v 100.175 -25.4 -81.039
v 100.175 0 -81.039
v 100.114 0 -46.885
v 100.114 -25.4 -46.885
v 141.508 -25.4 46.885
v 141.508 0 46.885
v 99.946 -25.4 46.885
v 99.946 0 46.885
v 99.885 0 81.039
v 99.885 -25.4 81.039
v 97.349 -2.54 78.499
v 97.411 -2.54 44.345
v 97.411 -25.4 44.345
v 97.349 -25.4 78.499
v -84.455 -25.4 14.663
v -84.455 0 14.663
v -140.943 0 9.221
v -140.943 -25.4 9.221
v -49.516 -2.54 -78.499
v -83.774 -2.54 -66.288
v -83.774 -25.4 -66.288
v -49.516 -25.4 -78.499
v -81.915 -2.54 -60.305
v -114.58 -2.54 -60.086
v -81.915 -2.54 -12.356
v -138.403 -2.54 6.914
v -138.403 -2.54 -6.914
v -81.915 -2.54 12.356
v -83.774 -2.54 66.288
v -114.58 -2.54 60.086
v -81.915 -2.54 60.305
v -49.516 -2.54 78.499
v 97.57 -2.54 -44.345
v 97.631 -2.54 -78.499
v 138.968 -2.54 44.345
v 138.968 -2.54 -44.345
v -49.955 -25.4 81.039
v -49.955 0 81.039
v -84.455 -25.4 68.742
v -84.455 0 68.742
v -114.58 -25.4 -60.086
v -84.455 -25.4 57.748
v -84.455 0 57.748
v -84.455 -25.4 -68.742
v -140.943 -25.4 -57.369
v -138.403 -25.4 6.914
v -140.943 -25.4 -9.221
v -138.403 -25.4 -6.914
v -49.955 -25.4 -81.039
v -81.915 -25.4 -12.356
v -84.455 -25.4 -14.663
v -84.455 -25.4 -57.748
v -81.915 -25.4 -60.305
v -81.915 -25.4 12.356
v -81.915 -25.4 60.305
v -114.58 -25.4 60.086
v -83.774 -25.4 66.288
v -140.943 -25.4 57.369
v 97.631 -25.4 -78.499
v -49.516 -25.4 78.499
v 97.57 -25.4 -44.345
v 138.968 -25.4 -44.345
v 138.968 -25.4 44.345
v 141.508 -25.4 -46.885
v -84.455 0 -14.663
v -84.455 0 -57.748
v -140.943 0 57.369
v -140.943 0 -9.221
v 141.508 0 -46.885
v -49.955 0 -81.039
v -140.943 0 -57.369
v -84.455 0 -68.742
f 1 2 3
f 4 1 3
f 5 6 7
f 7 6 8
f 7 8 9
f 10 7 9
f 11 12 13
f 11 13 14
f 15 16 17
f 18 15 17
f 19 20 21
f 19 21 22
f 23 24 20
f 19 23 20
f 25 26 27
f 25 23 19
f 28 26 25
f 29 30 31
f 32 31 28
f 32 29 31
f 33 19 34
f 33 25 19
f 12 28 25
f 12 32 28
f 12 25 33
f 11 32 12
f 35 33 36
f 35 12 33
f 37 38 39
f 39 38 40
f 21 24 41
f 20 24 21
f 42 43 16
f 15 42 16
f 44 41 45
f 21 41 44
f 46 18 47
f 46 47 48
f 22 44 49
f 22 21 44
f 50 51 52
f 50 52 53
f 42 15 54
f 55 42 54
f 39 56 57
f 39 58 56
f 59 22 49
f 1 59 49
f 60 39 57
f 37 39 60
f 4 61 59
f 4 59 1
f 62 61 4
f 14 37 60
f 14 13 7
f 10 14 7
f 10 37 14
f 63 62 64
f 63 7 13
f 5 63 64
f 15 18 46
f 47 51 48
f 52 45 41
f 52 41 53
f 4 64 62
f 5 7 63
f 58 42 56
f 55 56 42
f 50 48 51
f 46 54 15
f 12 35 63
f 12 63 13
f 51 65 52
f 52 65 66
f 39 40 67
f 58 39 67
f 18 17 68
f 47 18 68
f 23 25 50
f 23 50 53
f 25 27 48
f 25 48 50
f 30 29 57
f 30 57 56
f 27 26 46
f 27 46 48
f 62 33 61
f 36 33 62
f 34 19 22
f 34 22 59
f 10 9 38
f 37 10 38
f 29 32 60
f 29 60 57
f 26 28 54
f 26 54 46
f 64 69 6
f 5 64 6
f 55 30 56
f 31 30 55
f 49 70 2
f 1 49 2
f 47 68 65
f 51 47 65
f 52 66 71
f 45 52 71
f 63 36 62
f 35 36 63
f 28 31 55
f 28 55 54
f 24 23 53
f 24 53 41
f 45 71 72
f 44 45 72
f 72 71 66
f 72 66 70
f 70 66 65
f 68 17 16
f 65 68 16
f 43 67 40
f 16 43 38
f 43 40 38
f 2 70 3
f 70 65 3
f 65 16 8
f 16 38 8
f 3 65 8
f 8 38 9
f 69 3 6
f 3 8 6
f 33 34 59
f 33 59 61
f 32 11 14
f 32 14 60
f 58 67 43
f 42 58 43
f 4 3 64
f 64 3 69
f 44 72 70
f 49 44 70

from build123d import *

# Parameters (mm, degrees)
F1_DEPTH = 25.4
F2_T     = -2.54


with BuildPart() as f1:
    # F0 (on Front) → F1 (new body)
    with BuildSketch(Plane.XZ):
        Polygon((-49.9549284577, -57.7479749918), (-49.9549284577, 57.7479749918), (-84.4545662403, 57.7479749918), (-84.4545662403, 14.6633386612), (-84.4545662403, -14.6633386612), (-84.4545662403, -57.7479749918), align=None)
        Polygon((-84.4545662403, 57.7479749918), (-84.4545662403, 68.7423571944), (-140.9429758787, 57.3688596487), align=None)
        Polygon((-84.4545662403, -14.6633386612), (-84.4545662403, 14.6633386612), (-140.9429758787, 9.2210201547), (-140.9429758787, -9.2210201547), align=None)
        Polygon((-140.9429758787, -57.3688596487), (-84.4545662403, -68.7423571944), (-84.4545662403, -57.7479749918), align=None)
        Polygon((-84.4545662403, -68.7423571944), (-49.9549284577, -81.0392451267), (-49.9549284577, -57.7479749918), (-84.4545662403, -57.7479749918), align=None)
        Polygon((0, -81.0392451267), (0, 81.0392451267), (-49.9549284577, 81.0392451267), (-49.9549284577, 57.7479749918), (-49.9549284577, -57.7479749918), (-49.9549284577, -81.0392451267), align=None)
        Polygon((99.88479051, 81.0392451267), (0, 81.0392451267), (0, -81.0392451267), (100.1753211021, -81.0392451267), (100.1140988569, -46.8851514161), (99.9460127552, 46.8851514161), align=None)
        Polygon((141.5084600449, 46.8851514161), (99.9460127552, 46.8851514161), (100.1140988569, -46.8851514161), (141.5084600449, -46.8851514161), (141.5084600449, 0), align=None)
        Polygon((-49.9549284577, 57.7479749918), (-49.9549284577, 81.0392451267), (-84.4545662403, 68.7423571944), (-84.4545662403, 57.7479749918), align=None)
    extrude(amount=F1_DEPTH)

    # F2
    f2_openings = [f1.faces().sort_by_distance(p)[0] for p in [
        (14.722317, -25.4, -0.014513),
    ]]
    offset(amount=F2_T, openings=f2_openings, kind=Kind.INTERSECTION)


solid = f1.part
